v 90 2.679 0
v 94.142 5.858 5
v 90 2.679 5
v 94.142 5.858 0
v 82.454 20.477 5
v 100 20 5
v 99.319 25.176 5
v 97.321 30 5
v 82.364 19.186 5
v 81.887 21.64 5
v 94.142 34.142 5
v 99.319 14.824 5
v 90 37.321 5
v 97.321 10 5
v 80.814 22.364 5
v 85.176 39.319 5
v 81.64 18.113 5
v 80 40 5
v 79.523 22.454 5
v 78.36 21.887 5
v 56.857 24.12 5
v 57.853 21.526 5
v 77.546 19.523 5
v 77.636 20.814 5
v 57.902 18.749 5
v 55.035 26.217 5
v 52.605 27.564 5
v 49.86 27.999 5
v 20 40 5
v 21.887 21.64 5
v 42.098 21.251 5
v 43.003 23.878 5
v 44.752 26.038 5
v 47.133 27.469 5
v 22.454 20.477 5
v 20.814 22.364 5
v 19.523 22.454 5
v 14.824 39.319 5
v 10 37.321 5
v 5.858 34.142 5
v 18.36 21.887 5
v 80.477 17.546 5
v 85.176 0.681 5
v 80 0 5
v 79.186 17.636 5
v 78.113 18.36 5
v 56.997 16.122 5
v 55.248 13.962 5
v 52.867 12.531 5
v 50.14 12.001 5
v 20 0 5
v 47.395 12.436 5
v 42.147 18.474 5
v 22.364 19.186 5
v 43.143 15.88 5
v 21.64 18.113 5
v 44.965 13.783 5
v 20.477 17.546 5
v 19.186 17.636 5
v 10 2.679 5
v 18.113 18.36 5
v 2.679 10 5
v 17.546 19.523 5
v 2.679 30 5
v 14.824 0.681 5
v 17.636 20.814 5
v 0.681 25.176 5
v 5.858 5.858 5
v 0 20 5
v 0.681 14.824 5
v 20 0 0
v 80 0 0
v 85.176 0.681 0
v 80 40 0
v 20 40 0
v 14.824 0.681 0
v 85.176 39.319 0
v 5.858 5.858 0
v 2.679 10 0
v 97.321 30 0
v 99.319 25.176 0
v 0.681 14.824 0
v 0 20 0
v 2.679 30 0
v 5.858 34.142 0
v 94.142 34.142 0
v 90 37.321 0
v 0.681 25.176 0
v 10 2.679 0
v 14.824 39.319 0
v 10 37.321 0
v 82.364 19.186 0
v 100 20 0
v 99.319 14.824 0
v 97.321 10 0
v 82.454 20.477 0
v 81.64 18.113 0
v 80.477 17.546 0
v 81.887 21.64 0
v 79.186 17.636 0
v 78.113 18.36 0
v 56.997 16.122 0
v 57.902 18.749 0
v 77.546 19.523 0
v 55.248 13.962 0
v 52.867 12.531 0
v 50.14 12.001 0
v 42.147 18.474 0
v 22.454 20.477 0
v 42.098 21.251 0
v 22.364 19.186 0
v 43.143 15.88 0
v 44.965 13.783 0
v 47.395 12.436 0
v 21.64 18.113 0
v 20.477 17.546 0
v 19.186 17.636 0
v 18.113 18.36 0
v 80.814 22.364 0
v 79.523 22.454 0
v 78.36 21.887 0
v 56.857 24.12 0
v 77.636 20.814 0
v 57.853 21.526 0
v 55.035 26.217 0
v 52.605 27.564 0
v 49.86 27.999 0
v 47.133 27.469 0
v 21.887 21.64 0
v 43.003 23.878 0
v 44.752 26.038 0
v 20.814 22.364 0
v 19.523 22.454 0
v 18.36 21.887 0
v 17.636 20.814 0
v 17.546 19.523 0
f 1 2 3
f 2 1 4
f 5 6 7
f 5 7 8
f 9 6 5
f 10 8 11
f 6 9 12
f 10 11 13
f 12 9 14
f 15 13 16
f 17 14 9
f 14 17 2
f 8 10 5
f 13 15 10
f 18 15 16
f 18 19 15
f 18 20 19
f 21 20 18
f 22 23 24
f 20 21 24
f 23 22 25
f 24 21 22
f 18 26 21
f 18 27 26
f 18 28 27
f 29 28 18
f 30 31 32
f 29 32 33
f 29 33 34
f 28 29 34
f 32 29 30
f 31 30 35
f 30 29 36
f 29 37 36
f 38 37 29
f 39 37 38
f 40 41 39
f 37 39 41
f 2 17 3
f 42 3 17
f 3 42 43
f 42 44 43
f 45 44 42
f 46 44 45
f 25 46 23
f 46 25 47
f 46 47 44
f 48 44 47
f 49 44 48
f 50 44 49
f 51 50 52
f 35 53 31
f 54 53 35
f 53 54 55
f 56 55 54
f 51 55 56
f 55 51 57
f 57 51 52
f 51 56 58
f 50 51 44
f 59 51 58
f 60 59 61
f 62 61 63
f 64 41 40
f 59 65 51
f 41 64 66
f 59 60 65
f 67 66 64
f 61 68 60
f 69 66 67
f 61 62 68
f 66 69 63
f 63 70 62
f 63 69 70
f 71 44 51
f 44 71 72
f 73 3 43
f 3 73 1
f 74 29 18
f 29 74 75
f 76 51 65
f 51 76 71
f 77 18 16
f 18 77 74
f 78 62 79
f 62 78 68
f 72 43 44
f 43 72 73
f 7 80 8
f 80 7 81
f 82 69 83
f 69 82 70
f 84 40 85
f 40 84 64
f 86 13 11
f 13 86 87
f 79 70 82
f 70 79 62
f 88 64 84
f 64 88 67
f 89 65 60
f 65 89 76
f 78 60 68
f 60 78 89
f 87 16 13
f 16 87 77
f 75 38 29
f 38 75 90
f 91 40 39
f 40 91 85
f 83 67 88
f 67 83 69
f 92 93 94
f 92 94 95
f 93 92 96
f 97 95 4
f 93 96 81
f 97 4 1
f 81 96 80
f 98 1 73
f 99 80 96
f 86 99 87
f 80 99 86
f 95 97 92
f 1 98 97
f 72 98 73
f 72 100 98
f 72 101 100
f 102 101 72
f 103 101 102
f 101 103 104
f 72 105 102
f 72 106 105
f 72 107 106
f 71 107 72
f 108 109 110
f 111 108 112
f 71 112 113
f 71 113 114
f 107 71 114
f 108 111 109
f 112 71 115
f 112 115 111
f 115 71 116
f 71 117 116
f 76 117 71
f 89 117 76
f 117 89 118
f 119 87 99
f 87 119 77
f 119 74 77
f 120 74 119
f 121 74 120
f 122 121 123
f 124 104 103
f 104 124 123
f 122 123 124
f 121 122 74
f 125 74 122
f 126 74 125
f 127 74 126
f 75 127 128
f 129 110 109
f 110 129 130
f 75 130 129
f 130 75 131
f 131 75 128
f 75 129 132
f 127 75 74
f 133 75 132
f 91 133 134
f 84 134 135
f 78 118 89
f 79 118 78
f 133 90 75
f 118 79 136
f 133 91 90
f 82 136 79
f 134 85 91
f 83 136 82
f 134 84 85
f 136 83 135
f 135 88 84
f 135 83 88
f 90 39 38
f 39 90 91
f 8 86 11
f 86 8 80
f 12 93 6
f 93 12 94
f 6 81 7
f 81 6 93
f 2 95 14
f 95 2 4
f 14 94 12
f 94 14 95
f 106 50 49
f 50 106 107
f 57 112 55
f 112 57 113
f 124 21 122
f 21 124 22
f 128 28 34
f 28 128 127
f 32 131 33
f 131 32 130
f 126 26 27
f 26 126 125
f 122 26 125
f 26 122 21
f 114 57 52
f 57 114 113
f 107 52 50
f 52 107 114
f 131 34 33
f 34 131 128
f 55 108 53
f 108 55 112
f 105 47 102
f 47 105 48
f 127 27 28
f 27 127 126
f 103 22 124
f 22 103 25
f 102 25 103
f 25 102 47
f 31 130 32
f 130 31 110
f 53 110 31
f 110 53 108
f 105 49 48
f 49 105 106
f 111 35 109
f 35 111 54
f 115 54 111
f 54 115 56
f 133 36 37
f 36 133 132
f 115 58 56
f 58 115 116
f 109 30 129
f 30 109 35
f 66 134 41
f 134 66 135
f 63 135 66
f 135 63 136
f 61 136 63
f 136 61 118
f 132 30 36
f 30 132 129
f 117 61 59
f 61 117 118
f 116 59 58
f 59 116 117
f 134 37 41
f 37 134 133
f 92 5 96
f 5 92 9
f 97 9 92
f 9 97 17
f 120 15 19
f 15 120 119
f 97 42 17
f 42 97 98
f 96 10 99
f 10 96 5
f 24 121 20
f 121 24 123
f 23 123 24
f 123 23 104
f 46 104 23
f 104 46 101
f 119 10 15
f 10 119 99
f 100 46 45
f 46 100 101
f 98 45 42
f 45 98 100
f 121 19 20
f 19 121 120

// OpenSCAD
$fn = 32;

// ----------------------------------------------------------------------
// Spacer plate: obround span 60, caps R20
// ----------------------------------------------------------------------

// --- parameters (mm) ---
bore_r = 8;               // centre bore radius
bolt_r = 2.5;             // bolt hole radius
plate_t = 5;              // plate thickness, Z (extrusion height)
span = 60;                // obround span
cap_r = 20;               // cap radius
fit_tol = 0.05;           // declared fit tolerance (prompt contract)
free_tol = 0.3;           // declared free tolerance (prompt contract)

profile = [[20, 40], [14.824, 39.319], [10, 37.321], [5.858, 34.142], [2.679, 30], [0.681, 25.176], [0, 20], [0.681, 14.824], [2.679, 10], [5.858, 5.858], [10, 2.679], [14.824, 0.681], [20, 0], [80, 0], [85.176, 0.681], [90, 2.679], [94.142, 5.858], [97.321, 10], [99.319, 14.824], [100, 20], [99.319, 25.176], [97.321, 30], [94.142, 34.142], [90, 37.321], [85.176, 39.319], [80, 40]];  // primary outline, 26 points, counter clockwise
void_1 = [[57.853, 21.526], [56.857, 24.12], [55.035, 26.217], [52.605, 27.564], [49.86, 27.999], [47.133, 27.469], [44.752, 26.038], [43.003, 23.878], [42.098, 21.251], [42.147, 18.474], [43.143, 15.88], [44.965, 13.783], [47.395, 12.436], [50.14, 12.001], [52.867, 12.531], [55.248, 13.962], [56.997, 16.122], [57.902, 18.749]];  // centre bore, 18 points
void_2 = [[22.454, 20.477], [21.887, 21.64], [20.814, 22.364], [19.523, 22.454], [18.36, 21.887], [17.636, 20.814], [17.546, 19.523], [18.113, 18.36], [19.186, 17.636], [20.477, 17.546], [21.64, 18.113], [22.364, 19.186]];  // end hole, 12 points
void_3 = [[82.454, 20.477], [81.887, 21.64], [80.814, 22.364], [79.523, 22.454], [78.36, 21.887], [77.636, 20.814], [77.546, 19.523], [78.113, 18.36], [79.186, 17.636], [80.477, 17.546], [81.64, 18.113], [82.364, 19.186]];  // end hole, 12 points

// --- the one profile operation ---
difference() {
  linear_extrude(height = plate_t) polygon(points = profile);
  translate([0, 0, -1])
    linear_extrude(height = plate_t + 2) polygon(points = void_1);
  translate([0, 0, -1])
    linear_extrude(height = plate_t + 2) polygon(points = void_2);
  translate([0, 0, -1])
    linear_extrude(height = plate_t + 2) polygon(points = void_3);
}
